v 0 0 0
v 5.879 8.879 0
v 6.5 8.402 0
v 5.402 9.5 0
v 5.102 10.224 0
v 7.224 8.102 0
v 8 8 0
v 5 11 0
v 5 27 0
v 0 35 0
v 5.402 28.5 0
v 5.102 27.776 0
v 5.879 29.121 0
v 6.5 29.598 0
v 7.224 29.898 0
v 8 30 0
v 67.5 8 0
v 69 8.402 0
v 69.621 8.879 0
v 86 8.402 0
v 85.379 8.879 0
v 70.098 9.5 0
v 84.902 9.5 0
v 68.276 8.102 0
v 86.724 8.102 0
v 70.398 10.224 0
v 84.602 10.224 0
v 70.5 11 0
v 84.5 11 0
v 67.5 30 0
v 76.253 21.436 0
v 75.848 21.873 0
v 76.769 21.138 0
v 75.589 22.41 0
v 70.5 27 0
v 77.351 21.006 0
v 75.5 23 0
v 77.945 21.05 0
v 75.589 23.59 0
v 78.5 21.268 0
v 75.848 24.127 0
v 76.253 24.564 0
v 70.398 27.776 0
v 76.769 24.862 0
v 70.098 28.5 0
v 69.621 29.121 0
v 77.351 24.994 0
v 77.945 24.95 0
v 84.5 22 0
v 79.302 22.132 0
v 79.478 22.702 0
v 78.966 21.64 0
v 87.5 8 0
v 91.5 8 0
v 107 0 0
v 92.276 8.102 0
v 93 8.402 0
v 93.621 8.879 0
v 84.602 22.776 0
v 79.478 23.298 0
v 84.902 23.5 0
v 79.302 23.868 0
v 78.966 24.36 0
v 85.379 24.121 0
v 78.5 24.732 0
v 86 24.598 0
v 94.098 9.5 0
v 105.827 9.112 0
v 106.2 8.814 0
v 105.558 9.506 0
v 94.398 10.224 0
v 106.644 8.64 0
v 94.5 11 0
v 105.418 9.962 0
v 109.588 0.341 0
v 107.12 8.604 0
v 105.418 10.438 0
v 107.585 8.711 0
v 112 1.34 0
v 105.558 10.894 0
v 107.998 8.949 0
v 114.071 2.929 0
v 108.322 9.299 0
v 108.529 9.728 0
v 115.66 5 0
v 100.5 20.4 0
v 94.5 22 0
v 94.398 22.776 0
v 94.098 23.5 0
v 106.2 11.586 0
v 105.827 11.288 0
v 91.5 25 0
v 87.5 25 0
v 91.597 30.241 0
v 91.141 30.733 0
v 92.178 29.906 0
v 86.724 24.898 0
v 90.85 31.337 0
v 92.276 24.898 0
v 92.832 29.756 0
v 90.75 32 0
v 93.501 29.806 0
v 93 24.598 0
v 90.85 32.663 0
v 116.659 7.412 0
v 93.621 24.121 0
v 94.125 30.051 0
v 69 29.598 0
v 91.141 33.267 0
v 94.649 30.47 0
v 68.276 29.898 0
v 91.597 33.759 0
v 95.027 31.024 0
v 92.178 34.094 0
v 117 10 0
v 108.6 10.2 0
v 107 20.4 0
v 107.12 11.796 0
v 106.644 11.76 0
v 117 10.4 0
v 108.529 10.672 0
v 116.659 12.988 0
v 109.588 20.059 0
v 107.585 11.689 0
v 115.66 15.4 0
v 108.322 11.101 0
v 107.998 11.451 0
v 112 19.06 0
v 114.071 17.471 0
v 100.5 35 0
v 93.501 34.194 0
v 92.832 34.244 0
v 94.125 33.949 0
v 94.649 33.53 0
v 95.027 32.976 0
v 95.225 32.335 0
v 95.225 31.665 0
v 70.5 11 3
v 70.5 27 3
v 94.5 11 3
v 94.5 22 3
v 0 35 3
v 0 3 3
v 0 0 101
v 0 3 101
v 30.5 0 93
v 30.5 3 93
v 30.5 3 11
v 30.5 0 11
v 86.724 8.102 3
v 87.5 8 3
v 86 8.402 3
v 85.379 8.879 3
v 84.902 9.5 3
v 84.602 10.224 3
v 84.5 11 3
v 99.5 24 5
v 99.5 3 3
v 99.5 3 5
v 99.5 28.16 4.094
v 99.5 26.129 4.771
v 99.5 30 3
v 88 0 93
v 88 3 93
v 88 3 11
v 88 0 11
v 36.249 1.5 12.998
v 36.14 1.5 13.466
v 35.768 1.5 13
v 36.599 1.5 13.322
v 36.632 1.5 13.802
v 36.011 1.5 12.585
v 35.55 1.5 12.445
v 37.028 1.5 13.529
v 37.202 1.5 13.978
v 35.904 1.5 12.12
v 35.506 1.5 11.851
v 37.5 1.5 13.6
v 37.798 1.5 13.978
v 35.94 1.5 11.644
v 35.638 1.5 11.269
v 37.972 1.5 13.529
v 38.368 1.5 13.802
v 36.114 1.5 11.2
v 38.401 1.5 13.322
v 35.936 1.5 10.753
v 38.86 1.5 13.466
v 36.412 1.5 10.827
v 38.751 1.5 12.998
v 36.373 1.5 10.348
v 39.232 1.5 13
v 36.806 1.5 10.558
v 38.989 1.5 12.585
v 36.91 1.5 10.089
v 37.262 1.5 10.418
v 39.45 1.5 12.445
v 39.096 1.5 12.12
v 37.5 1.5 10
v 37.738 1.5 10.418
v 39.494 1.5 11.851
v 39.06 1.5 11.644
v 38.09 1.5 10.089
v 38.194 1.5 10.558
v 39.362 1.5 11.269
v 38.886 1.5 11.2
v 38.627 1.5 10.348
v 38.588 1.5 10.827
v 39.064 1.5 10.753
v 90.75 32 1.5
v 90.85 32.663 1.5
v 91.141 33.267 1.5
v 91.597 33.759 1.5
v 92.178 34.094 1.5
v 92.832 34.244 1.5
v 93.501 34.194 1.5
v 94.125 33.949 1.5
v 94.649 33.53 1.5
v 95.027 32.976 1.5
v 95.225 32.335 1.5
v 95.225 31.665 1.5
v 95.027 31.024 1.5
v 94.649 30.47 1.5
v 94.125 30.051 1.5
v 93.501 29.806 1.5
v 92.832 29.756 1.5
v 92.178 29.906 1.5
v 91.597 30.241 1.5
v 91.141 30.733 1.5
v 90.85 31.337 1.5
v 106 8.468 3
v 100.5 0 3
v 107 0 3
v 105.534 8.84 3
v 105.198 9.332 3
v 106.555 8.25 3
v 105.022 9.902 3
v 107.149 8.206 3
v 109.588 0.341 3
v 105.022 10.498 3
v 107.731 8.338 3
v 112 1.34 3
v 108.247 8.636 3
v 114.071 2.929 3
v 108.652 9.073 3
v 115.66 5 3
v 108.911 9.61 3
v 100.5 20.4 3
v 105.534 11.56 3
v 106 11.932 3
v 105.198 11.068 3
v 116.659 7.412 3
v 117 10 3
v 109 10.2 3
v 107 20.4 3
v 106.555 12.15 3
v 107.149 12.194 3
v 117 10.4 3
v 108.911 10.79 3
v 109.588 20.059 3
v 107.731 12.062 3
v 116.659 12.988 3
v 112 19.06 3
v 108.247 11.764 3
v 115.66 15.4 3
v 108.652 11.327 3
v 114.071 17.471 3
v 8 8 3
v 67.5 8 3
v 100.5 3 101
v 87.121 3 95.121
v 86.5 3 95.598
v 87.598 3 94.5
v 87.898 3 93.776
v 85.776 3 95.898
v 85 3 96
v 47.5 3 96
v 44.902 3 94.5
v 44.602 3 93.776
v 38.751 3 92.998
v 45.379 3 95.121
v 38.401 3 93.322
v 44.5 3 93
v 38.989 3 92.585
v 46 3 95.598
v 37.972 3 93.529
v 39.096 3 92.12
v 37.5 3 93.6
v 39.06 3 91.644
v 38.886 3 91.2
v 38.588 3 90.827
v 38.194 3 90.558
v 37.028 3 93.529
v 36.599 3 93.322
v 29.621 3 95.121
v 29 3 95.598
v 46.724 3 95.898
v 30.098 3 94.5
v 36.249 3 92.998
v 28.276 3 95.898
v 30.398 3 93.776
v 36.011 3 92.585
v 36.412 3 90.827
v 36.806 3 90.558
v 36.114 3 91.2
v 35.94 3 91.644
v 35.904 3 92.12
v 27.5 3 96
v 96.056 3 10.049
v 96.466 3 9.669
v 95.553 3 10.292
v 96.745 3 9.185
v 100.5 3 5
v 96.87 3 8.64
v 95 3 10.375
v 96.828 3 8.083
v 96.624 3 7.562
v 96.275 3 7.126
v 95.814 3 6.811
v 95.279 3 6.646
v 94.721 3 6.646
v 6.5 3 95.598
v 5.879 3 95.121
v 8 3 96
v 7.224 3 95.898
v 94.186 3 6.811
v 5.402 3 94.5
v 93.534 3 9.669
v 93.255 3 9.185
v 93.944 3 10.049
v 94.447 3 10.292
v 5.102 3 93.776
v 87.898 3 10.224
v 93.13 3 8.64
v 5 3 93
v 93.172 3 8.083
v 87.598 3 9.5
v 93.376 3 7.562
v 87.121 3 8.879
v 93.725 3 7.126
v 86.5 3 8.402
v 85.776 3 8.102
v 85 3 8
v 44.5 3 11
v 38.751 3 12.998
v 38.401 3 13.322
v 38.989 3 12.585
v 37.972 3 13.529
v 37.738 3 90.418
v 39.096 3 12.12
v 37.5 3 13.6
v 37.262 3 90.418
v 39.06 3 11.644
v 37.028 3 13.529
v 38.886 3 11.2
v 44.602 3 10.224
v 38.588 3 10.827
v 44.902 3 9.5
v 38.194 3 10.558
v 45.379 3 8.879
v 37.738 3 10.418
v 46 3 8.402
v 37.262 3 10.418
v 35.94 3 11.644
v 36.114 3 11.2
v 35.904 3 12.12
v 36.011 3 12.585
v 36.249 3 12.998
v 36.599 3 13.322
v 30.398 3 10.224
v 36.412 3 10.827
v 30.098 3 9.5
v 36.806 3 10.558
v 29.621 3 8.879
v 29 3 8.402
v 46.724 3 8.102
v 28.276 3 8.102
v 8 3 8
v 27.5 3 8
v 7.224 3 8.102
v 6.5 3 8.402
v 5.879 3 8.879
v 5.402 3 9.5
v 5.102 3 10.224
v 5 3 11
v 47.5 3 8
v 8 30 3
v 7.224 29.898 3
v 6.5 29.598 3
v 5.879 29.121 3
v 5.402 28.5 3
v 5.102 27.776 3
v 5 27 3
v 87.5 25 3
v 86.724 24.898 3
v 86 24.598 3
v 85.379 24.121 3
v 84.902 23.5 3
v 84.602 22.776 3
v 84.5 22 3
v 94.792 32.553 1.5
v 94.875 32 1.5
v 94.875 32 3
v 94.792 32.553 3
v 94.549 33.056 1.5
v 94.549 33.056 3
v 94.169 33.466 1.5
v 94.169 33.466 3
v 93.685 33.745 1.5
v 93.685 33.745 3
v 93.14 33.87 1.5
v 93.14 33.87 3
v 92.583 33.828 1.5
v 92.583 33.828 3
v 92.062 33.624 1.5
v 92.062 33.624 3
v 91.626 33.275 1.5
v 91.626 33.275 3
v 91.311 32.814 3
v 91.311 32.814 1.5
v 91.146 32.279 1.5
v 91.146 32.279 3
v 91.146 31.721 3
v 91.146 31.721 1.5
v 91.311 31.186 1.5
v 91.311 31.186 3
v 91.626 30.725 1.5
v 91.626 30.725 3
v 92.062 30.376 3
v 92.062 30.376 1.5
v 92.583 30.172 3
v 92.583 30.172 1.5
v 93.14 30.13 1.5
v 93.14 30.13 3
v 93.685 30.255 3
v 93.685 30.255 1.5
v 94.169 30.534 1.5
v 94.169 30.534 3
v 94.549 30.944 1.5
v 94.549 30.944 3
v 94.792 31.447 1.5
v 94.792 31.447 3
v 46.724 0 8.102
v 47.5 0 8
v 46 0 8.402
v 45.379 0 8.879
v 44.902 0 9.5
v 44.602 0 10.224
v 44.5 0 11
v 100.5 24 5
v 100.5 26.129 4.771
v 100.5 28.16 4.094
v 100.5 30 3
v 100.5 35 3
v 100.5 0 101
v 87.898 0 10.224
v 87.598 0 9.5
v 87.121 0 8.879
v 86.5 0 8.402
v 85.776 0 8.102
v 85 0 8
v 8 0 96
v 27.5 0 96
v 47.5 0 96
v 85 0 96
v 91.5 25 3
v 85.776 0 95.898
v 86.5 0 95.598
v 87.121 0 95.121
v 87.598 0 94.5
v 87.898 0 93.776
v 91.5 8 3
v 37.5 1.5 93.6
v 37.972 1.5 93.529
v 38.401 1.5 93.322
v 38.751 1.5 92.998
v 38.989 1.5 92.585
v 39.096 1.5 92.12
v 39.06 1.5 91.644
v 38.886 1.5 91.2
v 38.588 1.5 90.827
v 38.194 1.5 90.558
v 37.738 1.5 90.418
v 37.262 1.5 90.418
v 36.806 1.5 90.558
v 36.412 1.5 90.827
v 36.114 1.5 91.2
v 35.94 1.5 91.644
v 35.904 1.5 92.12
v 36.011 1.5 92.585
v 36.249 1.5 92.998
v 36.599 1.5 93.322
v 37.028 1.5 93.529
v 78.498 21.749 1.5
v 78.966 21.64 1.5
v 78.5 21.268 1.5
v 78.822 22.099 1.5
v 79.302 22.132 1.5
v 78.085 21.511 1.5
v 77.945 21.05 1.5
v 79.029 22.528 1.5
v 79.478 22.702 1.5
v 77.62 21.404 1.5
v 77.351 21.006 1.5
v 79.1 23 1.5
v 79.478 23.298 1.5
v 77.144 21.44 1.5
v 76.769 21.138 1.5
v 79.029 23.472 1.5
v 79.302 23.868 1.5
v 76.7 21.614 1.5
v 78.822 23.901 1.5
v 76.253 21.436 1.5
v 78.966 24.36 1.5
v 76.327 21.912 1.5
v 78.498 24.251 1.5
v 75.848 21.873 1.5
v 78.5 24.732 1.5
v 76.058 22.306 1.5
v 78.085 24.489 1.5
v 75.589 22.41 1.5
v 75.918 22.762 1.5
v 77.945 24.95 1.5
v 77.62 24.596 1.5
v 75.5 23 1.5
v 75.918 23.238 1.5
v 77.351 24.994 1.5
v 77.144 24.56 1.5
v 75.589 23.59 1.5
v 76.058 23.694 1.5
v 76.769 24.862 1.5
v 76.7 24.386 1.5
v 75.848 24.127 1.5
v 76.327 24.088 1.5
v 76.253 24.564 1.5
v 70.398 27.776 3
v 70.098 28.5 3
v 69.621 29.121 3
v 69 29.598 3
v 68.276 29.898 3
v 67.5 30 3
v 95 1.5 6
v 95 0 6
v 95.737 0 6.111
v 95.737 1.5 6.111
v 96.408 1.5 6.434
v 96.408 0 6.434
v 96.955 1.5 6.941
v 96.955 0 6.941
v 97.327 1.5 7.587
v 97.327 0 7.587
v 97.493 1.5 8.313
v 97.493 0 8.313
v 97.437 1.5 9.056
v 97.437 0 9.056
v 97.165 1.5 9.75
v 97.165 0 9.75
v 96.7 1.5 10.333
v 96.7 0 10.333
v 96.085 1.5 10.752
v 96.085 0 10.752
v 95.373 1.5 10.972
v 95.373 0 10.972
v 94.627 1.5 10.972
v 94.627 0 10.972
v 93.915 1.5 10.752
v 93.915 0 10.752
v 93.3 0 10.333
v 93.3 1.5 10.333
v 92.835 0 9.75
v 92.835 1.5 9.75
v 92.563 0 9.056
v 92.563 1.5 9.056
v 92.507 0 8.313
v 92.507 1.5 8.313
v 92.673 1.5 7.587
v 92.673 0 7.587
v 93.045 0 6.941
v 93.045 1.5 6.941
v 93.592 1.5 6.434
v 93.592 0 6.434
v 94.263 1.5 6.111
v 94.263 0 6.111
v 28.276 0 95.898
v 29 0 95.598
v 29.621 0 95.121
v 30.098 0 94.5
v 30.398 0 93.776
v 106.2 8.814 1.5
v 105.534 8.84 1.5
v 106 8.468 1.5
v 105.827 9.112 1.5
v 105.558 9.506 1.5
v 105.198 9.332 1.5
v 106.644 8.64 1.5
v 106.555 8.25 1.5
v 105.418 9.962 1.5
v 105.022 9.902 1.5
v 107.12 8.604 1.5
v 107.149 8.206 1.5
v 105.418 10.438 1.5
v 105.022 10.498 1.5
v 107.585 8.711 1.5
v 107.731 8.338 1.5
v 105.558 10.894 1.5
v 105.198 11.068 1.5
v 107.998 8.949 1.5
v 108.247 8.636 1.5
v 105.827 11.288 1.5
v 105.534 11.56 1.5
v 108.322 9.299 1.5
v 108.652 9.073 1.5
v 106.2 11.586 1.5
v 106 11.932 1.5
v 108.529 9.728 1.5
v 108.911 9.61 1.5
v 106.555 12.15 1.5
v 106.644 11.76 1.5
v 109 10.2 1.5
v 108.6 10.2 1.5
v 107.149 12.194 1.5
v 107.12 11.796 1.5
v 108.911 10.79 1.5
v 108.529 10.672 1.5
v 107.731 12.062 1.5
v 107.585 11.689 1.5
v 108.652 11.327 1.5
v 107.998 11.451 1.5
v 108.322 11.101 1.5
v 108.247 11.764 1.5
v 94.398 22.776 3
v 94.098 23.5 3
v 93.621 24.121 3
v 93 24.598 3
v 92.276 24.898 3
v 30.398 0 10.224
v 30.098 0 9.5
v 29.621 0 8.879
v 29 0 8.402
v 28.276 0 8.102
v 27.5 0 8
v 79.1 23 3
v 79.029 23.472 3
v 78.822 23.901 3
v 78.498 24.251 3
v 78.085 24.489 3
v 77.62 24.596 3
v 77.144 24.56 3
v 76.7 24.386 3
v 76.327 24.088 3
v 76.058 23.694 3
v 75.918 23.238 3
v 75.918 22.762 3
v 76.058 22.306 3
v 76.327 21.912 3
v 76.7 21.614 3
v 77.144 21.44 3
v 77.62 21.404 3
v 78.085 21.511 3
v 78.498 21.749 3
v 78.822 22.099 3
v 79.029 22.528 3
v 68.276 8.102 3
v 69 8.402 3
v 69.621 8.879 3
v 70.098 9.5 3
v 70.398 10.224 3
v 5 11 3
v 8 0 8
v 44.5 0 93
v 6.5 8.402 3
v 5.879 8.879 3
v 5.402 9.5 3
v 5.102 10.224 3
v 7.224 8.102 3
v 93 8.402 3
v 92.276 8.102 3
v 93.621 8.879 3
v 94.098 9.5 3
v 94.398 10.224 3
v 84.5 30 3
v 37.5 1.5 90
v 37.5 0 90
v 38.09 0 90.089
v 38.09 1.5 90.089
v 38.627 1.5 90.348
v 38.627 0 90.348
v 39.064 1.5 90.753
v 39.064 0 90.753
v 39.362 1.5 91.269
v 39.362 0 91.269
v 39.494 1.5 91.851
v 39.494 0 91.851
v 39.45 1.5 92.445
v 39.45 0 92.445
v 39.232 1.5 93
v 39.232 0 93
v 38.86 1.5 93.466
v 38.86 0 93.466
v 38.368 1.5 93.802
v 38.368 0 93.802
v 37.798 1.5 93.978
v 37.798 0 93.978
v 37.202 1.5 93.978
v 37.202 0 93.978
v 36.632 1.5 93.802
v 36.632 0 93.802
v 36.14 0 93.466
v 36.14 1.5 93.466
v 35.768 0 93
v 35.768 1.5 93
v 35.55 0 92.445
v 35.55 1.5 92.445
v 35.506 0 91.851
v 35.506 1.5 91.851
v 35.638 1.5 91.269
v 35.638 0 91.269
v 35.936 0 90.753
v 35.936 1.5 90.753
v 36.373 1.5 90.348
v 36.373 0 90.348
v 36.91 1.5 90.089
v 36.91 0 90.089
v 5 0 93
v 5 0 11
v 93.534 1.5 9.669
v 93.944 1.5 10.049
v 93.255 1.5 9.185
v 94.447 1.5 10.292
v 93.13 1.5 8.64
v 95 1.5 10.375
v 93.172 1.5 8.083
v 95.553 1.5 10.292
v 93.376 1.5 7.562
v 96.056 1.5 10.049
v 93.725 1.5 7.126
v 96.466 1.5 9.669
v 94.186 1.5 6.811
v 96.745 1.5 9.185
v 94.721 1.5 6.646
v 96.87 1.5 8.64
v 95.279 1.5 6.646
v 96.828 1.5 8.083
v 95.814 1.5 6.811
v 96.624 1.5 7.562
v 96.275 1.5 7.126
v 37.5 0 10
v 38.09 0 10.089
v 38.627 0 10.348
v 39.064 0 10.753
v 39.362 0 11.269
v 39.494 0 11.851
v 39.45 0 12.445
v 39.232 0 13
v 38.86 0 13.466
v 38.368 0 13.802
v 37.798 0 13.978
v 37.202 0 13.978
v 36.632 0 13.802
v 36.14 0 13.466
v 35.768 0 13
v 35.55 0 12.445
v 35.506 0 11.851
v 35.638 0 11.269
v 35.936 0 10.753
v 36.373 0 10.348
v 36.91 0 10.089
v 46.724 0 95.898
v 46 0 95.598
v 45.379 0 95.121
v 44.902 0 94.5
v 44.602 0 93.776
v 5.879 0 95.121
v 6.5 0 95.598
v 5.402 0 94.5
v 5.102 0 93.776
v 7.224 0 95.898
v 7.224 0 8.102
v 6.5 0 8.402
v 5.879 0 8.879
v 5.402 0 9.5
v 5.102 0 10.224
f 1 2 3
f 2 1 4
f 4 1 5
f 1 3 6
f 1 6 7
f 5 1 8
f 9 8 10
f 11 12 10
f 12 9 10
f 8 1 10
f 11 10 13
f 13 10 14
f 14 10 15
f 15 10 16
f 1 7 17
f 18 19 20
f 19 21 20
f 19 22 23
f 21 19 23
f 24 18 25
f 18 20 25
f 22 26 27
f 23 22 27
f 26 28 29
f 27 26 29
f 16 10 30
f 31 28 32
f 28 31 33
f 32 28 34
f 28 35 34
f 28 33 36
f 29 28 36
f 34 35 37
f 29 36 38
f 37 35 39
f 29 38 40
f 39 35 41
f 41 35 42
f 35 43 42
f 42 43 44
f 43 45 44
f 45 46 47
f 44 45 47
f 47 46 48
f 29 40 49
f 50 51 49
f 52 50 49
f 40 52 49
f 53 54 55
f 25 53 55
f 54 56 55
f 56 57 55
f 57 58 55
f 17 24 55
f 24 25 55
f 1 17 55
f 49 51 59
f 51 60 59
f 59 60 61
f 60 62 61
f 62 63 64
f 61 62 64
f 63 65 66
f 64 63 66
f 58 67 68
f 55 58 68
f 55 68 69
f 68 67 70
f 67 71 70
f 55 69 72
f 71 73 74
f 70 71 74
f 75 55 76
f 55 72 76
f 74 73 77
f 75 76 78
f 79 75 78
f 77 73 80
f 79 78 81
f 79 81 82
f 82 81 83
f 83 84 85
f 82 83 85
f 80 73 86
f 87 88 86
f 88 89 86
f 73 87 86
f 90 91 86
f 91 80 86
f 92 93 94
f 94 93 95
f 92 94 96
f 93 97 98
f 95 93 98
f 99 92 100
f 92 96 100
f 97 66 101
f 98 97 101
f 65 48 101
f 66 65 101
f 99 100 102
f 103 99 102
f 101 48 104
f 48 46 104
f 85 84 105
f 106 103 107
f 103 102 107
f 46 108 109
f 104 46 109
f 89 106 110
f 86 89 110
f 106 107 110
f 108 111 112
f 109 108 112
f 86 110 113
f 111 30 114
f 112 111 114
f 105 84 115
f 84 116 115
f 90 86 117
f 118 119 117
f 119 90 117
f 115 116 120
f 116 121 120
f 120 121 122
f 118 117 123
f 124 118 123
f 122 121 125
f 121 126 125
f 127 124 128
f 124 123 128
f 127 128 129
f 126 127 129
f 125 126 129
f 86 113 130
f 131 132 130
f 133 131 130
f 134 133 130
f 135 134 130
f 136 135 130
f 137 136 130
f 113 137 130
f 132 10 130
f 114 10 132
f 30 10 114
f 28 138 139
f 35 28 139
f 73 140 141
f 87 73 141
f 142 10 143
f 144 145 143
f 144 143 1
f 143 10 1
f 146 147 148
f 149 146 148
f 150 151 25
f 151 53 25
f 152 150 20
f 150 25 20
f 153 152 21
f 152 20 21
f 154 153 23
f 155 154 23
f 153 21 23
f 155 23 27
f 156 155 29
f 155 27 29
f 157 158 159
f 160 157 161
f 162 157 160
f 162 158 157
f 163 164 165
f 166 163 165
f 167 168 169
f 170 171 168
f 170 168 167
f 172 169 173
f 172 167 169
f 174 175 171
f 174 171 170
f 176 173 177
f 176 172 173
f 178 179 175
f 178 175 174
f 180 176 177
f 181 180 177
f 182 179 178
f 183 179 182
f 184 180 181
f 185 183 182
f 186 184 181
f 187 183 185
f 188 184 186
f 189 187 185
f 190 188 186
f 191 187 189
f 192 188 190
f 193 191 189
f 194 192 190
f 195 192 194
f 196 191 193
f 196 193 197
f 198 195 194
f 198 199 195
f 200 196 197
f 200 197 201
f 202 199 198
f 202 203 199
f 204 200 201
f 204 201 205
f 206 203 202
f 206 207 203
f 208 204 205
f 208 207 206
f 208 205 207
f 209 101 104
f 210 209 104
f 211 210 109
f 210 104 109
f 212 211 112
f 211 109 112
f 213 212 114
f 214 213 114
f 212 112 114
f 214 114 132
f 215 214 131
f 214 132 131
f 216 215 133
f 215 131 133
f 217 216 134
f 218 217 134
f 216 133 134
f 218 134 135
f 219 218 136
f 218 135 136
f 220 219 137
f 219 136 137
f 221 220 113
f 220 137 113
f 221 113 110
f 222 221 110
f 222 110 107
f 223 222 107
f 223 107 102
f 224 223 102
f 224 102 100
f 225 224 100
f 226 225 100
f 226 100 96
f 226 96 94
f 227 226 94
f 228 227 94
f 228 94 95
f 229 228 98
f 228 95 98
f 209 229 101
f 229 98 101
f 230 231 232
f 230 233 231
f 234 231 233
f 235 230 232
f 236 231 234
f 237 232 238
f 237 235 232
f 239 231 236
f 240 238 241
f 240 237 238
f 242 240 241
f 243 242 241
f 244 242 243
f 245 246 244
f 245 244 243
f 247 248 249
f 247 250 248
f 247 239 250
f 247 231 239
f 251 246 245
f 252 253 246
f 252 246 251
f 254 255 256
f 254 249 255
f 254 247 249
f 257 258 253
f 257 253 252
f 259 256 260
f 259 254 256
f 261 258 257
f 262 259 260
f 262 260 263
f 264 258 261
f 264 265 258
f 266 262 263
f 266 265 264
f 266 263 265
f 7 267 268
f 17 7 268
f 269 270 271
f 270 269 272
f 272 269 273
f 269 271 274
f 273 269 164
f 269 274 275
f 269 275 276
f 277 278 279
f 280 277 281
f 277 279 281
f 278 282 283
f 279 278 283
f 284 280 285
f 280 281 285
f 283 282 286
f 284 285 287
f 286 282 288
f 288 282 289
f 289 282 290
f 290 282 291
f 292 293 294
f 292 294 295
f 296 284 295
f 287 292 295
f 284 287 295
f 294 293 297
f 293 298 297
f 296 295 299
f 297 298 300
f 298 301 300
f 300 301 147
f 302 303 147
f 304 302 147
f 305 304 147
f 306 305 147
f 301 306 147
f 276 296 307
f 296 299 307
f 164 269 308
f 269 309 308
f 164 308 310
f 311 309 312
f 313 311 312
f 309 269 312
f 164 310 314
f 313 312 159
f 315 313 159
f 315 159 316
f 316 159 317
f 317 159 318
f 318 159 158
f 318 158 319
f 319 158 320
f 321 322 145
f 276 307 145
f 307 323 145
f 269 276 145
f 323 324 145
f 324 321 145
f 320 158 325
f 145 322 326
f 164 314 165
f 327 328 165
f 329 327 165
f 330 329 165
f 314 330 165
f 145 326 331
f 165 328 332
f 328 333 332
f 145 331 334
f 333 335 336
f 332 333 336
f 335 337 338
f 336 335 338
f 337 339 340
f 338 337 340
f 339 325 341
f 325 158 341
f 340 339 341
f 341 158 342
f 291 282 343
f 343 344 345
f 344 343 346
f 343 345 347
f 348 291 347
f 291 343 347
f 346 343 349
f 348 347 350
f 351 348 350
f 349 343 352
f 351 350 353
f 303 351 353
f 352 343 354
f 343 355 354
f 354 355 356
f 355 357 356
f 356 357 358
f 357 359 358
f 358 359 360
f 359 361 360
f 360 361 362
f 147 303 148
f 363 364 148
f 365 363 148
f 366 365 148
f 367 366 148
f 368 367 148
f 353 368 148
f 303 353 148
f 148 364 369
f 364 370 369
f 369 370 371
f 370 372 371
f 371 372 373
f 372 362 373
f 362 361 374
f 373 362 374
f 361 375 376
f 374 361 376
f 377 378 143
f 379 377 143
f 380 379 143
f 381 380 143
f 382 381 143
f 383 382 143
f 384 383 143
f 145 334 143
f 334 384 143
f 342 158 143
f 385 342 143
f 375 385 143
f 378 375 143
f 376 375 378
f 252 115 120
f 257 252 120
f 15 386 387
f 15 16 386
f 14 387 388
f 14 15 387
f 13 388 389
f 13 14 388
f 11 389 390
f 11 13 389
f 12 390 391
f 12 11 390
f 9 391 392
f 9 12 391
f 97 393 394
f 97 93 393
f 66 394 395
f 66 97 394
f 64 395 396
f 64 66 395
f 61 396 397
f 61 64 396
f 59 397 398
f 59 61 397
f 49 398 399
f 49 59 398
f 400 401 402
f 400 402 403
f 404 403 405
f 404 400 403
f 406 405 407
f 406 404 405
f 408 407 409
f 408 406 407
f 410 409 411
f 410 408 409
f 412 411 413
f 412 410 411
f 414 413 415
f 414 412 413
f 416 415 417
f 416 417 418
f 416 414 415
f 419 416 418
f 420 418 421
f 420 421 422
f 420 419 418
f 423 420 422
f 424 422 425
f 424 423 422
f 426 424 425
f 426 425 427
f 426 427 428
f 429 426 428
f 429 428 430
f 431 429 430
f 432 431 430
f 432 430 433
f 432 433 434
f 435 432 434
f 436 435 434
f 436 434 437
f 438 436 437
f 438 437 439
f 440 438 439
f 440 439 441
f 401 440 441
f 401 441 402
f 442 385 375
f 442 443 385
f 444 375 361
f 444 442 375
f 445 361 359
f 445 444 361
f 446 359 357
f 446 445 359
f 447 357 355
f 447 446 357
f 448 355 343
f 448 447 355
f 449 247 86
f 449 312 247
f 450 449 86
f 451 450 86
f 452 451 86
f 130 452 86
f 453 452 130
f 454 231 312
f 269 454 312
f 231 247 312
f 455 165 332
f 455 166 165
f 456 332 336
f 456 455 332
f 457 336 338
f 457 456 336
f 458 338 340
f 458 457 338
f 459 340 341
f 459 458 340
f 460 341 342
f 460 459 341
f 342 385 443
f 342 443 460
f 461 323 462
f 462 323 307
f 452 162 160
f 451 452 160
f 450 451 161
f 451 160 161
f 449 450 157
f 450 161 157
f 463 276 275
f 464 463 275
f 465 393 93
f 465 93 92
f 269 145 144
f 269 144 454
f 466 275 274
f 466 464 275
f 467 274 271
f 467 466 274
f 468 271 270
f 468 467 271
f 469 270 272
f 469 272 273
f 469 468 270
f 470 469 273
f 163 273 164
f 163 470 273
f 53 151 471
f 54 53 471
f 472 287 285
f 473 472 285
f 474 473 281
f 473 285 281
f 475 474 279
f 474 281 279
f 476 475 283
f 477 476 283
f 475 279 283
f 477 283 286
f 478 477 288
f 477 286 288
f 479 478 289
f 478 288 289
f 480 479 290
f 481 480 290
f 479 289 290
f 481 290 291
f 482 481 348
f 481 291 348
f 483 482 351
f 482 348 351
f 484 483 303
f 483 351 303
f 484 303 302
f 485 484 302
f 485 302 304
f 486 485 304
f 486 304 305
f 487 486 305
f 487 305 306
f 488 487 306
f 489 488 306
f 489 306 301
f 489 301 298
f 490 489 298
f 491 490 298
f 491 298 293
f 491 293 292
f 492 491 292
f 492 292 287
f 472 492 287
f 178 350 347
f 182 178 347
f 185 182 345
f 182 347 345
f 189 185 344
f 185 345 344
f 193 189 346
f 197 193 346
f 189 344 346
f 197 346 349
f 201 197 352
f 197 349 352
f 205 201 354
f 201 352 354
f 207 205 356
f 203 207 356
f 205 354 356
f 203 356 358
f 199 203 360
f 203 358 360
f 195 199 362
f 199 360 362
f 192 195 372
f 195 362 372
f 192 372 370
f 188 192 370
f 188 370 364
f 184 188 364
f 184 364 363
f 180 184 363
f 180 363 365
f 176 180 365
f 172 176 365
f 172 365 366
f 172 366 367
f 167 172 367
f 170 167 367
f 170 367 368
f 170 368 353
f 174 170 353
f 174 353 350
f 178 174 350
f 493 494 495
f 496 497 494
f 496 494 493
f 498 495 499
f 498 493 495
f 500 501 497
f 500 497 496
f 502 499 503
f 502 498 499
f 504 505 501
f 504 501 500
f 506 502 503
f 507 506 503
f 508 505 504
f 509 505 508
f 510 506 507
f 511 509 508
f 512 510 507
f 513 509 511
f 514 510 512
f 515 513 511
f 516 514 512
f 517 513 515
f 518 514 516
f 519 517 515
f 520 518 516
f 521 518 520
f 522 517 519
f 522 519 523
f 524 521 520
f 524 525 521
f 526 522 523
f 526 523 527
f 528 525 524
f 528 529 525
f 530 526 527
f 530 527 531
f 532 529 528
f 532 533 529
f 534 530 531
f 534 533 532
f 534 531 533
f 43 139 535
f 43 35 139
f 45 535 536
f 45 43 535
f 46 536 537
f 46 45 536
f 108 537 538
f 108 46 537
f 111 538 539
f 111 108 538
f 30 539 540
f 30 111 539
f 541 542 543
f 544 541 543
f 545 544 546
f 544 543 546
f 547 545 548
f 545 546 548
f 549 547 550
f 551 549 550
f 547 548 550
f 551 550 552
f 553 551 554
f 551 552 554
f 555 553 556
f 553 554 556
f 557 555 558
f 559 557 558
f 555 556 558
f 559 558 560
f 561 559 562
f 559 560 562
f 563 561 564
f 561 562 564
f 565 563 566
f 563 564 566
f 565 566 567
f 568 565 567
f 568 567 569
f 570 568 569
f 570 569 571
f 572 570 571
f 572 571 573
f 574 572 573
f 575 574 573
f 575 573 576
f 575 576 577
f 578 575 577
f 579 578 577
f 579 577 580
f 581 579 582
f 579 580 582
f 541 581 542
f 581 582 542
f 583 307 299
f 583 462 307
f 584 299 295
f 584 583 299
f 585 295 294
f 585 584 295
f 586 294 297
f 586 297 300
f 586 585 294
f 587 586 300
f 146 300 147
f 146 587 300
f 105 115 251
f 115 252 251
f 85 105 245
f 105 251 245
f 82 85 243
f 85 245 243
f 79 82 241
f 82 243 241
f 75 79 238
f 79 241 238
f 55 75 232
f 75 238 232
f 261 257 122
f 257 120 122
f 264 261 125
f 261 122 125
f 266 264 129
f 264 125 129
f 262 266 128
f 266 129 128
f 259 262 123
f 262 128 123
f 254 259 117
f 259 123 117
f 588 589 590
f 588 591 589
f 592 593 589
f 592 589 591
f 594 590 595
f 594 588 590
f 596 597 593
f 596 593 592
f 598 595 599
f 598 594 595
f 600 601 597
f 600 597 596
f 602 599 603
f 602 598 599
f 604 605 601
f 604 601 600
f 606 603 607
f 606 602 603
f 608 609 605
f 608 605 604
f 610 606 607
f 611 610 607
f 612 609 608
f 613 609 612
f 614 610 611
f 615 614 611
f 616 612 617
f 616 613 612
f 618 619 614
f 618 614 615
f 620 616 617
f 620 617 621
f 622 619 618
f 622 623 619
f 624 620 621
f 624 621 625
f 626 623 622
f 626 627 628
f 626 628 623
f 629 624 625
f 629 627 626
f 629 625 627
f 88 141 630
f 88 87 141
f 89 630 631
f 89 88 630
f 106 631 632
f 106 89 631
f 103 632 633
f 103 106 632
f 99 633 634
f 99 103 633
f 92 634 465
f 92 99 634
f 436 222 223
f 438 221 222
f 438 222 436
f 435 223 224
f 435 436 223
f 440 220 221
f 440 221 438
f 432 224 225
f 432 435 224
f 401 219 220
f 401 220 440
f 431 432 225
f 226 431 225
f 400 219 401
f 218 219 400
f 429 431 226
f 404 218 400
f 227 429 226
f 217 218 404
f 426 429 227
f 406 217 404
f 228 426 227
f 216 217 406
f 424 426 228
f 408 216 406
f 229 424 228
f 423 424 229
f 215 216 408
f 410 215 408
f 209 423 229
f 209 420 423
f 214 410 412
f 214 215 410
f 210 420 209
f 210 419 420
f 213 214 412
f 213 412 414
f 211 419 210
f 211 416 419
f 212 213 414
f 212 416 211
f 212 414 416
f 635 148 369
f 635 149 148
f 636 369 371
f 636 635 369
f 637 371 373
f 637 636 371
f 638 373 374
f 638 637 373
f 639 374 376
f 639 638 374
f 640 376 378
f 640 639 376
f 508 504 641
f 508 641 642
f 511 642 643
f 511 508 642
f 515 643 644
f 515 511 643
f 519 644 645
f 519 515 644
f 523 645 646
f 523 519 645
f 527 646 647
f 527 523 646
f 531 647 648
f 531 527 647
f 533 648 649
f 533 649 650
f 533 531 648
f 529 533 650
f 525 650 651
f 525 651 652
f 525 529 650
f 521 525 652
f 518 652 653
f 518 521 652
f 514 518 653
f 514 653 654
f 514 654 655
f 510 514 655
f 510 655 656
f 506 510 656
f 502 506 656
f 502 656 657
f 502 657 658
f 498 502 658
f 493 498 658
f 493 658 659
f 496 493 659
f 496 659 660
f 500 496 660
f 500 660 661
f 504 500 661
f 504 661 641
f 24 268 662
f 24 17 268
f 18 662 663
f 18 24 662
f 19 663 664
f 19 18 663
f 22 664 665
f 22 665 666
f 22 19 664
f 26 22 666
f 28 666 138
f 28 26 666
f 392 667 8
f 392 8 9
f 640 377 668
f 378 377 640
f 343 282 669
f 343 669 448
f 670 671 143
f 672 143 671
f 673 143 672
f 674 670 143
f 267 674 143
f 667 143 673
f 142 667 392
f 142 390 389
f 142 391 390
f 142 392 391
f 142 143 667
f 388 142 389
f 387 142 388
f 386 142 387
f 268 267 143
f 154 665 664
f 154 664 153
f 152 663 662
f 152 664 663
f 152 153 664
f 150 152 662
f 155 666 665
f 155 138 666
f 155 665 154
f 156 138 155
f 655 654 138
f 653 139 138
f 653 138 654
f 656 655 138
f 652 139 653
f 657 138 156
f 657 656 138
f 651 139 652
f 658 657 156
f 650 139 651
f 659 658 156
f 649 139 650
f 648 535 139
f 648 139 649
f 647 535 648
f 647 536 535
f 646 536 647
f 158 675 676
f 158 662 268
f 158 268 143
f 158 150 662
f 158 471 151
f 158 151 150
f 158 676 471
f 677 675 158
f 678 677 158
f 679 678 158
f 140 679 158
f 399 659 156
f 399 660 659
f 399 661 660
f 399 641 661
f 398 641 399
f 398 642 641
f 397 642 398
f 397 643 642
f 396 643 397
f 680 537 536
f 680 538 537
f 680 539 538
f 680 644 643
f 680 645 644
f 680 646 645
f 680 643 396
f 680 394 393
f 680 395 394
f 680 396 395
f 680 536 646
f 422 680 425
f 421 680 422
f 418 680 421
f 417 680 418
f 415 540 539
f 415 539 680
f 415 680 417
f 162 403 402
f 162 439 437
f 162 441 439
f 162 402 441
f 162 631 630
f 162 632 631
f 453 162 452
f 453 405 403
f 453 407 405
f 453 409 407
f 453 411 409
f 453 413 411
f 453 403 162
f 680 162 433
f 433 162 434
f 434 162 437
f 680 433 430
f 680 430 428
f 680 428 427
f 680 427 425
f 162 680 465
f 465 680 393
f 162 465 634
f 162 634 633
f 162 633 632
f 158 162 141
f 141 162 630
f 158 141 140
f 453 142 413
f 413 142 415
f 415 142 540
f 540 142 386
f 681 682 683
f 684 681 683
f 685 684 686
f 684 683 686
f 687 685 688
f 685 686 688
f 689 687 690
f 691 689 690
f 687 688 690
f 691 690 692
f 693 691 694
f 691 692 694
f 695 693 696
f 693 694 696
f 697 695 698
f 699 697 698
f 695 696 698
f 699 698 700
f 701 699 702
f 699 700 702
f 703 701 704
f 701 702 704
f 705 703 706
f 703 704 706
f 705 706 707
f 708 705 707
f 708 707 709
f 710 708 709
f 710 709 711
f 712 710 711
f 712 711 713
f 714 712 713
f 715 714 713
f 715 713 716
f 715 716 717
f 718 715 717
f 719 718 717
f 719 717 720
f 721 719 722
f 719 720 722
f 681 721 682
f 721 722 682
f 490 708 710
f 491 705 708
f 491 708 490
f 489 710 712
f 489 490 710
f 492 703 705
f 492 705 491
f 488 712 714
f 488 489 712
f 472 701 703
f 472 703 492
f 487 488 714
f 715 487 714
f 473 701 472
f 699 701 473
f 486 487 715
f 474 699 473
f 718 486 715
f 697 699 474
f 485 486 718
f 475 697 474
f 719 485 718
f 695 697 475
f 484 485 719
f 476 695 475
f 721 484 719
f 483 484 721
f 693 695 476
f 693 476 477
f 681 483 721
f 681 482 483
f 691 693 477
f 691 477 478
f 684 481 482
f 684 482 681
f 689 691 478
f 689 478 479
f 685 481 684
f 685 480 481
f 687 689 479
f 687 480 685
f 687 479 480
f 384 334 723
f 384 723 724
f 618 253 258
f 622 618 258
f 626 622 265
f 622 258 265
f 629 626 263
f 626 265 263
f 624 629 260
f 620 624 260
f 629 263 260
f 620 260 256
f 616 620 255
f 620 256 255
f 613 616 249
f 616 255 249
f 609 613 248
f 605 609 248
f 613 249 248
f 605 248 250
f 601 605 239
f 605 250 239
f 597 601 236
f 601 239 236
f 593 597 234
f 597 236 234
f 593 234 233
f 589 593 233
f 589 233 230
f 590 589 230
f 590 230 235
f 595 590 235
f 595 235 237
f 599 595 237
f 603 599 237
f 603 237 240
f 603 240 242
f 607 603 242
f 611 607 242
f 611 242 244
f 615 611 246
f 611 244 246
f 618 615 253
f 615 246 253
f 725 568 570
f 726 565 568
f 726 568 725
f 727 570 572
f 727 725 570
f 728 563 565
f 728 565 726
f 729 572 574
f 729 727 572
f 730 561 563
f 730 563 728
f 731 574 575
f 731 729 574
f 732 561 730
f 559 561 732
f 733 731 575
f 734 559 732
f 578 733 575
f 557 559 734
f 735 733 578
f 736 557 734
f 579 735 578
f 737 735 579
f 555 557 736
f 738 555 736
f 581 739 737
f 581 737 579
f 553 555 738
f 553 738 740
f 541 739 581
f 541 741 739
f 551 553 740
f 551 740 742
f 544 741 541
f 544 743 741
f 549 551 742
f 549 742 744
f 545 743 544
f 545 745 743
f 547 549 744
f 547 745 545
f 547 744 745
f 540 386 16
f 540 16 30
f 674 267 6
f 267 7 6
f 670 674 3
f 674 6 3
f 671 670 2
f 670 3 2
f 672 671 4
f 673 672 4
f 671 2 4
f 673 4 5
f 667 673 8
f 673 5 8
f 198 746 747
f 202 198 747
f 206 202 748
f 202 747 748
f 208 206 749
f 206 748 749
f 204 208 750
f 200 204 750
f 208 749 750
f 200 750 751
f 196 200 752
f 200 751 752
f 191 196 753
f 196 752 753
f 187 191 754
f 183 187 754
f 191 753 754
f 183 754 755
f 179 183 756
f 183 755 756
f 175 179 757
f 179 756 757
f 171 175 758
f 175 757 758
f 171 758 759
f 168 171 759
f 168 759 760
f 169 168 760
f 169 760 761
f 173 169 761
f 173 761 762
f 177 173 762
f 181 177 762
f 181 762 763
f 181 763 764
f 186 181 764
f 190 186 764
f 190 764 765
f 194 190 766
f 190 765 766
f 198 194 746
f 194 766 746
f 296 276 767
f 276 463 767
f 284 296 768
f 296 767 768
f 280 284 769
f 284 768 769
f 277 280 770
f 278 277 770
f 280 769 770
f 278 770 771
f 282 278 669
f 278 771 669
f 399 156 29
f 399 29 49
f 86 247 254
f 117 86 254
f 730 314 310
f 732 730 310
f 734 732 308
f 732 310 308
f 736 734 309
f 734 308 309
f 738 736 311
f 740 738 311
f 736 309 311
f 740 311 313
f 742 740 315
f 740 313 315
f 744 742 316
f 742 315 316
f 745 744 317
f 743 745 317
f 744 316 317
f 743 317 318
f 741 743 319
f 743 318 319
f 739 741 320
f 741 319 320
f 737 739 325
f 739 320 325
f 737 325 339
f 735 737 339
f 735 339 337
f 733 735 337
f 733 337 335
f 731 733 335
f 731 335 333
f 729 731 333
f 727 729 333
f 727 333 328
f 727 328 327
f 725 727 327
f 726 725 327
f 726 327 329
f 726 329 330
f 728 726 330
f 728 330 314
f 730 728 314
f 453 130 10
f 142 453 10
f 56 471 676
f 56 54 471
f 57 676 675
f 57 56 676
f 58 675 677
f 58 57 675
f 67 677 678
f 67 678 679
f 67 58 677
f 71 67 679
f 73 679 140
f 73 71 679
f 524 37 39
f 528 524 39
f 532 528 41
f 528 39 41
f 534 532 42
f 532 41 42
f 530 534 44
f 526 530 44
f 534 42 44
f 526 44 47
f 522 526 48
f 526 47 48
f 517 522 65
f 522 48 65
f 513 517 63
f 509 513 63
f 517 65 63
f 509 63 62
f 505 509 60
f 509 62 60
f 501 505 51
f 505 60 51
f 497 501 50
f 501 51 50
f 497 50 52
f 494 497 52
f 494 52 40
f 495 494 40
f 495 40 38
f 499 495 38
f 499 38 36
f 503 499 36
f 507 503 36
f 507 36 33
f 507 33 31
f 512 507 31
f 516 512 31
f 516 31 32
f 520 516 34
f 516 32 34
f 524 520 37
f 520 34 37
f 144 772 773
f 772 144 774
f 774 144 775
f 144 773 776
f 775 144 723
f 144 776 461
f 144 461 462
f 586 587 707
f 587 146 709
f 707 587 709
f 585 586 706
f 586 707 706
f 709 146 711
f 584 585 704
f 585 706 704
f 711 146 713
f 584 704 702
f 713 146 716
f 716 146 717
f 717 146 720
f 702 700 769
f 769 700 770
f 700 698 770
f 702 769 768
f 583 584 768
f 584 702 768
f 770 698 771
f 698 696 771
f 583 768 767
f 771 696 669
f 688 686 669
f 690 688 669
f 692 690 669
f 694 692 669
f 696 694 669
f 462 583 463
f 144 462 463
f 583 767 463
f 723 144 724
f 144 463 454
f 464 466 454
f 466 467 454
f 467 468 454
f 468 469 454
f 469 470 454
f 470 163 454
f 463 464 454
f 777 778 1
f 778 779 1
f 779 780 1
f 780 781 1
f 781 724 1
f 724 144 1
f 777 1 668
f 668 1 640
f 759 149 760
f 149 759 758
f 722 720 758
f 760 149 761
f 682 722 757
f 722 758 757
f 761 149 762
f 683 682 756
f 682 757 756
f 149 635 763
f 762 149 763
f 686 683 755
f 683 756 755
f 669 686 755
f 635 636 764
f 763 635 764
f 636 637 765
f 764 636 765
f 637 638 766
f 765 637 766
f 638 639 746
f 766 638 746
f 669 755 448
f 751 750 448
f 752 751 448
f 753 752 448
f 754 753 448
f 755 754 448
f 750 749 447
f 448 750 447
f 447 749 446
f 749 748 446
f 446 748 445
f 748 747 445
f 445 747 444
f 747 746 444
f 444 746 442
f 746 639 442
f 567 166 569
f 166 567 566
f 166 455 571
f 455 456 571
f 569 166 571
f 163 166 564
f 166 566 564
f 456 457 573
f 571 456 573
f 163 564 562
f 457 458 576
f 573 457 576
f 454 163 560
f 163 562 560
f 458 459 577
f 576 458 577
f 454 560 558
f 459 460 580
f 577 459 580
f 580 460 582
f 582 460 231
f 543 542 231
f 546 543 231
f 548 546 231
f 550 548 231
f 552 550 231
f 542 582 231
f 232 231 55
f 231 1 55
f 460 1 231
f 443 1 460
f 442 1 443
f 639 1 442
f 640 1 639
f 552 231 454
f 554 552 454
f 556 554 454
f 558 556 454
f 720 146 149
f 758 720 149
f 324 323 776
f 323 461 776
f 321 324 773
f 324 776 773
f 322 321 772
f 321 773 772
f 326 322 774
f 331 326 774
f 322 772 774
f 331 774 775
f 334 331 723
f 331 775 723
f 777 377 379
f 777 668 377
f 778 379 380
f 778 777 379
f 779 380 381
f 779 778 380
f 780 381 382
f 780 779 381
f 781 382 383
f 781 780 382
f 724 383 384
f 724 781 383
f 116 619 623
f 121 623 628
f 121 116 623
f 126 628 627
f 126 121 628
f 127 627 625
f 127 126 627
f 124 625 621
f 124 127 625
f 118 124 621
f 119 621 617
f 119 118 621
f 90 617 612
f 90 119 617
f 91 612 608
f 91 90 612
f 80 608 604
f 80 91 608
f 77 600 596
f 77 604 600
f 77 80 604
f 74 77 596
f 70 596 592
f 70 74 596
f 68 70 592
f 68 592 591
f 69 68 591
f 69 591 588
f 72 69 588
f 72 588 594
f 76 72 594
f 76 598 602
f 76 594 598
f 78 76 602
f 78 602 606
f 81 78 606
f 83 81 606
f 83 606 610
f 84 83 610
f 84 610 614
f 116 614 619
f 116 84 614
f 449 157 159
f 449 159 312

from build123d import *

# Parameters (mm, degrees)
SKETCH1_R           = 1.6
SKETCH1_R_2         = 1.875
BOSS_EXTRUDE1_DEPTH = 3
BOSS_EXTRUDE2_DEPTH = 101
SKETCH1_5_W         = 1
SKETCH1_5_H         = 27
BOSS_EXTRUDE3_DEPTH = 5
SKETCH2_W           = 16.5
SKETCH2_H           = 14.6
CUT_EXTRUDE1_DEPTH  = 5
SKETCH3_W           = 16.5
SKETCH3_H           = 98
CUT_EXTRUDE2_DEPTH  = 5
FILLET1_R           = 10
FILLET2_R           = 10
SKETCH4_R           = 1.6
SKETCH4_R_2         = 1.875
CUT_EXTRUDE3_DEPTH  = 5
FILLET3_R           = 10
SKETCH5_R           = 2
SKETCH5_R_2         = 2.5
CUT_EXTRUDE4_DEPTH  = 1.5
SKETCH6_R           = 2
CUT_EXTRUDE5_DEPTH  = 1.5
SKETCH7_R           = 2
SKETCH7_R_2         = 2.25
CUT_EXTRUDE6_DEPTH  = 1.5
SKETCH8_W           = 25.5
SKETCH8_H           = 88
SKETCH8_W_2         = 43.5
CUT_EXTRUDE7_DEPTH  = 10
FILLET4_R           = 3
SKETCH9_W           = 65.5
SKETCH9_H           = 22
SKETCH9_W_2         = 10
SKETCH9_H_2         = 17
CUT_EXTRUDE8_DEPTH  = 10
FILLET5_R           = 3


with BuildPart() as part:
    # Sketch1 → Boss-Extrude1 (new body)
    # profile 1 of 2: a face of its own
    with BuildSketch(Plane.XY):
        Polygon((0, 3), (0, 0), (117, 0), (117, 3), (100.5, 3), (99.5, 3), align=None)
    # profile 2 of 2: a face of its own
    with BuildSketch(Plane.XY):
        Polygon((0, 35), (0, 3), (99.5, 3), (99.5, 30), (100.5, 30), (100.5, 3), (117, 3), (117, 35), align=None)
        with Locations((107, 10.2)):
            Circle(SKETCH1_R, mode=Mode.SUBTRACT)
        with Locations((77.5, 23)):
            Circle(SKETCH1_R, mode=Mode.SUBTRACT)
        with Locations((93, 32)):
            Circle(SKETCH1_R_2, mode=Mode.SUBTRACT)
    extrude(amount=BOSS_EXTRUDE1_DEPTH)

    # Sketch1<4> → Boss-Extrude2 (add)
    with BuildSketch(Plane.XY):
        Polygon((0, 3), (0, 0), (117, 0), (117, 3), (100.5, 3), (99.5, 3), align=None)
    extrude(amount=BOSS_EXTRUDE2_DEPTH)

    # Sketch1<5> → Boss-Extrude3 (add)
    with BuildSketch(Plane.XY):
        with Locations((100, 16.5)):
            Rectangle(SKETCH1_5_W, SKETCH1_5_H)
    extrude(amount=BOSS_EXTRUDE3_DEPTH)

    # Sketch2 → Cut-Extrude1 (cut)
    with BuildSketch(Plane.XY.offset(3)):
        with Locations((108.75, 27.7)):
            Rectangle(SKETCH2_W, SKETCH2_H)
    extrude(amount=-CUT_EXTRUDE1_DEPTH, mode=Mode.SUBTRACT)

    # Sketch3 → Cut-Extrude2 (cut)
    with BuildSketch(Plane(origin=(0, 3, 0), x_dir=(1, 0, 0), z_dir=(0, 1, 0))):
        with Locations((108.75, -52)):
            Rectangle(SKETCH3_W, SKETCH3_H)
    extrude(amount=-CUT_EXTRUDE2_DEPTH, mode=Mode.SUBTRACT)

    # Fillet1
    fillet1_edges = [part.edges().sort_by_distance(p)[0] for p in [
        (117, 20.4, 1.5),
    ]]
    fillet(fillet1_edges, radius=FILLET1_R)

    # Fillet2
    fillet2_edges = [part.edges().sort_by_distance(p)[0] for p in [
        (117, 0, 1.5),
    ]]
    fillet(fillet2_edges, radius=FILLET2_R)

    # Sketch4 → Cut-Extrude3 (cut)
    with BuildSketch(Plane(origin=(0, 3, 0), x_dir=(1, 0, 0), z_dir=(0, 1, 0))):
        with Locations(Location((37.5, -12, 0), (0, 0, 270))):
            Circle(SKETCH4_R)
        with Locations(Location((37.5, -92, 0), (0, 0, 270))):
            Circle(SKETCH4_R)
        with Locations(Location((95, -8.5, 0), (0, 0, 270))):
            Circle(SKETCH4_R_2)
    extrude(amount=-CUT_EXTRUDE3_DEPTH, mode=Mode.SUBTRACT)

    # Fillet3
    # the kernel refuses this fillet: 10 mm, written as the material it takes off along each edge
    with BuildSketch(Plane(origin=(84.5, 30, 5), x_dir=(0, 0, -1), z_dir=(1, 0, 0))) as fillet3_piece_1:
        with BuildLine():
            CenterArc((10, -6), FILLET3_R, 143.130102354, 36.869897646)
            Line((0, -6), (-0.2, -6))
            Line((-0.2, -6), (-0.2, 0))
            Line((-0.2, 0), (0, 0.2))
            ThreePointArc((0, 0.2), (1, 0.2), (1.84, 0.12))
            Line((1.84, 0.12), (2, 0))
        make_face()
    extrude(amount=31, mode=Mode.SUBTRACT)

    # Sketch5 → Cut-Extrude4 (cut)
    with BuildSketch(Plane.XZ):
        with Locations(Location((37.5, 92, 0), (0, 0, 270))):
            Circle(SKETCH5_R)
        with Locations(Location((37.5, 12, 0), (0, 0, 270))):
            Circle(SKETCH5_R)
        with Locations(Location((95, 8.5, 0), (0, 0, 270))):
            Circle(SKETCH5_R_2)
    extrude(amount=-CUT_EXTRUDE4_DEPTH, mode=Mode.SUBTRACT)

    # Sketch6 → Cut-Extrude5 (cut)
    with BuildSketch(Plane.XY.offset(3)):
        with Locations((107, 10.2)):
            Circle(SKETCH6_R)
    extrude(amount=-CUT_EXTRUDE5_DEPTH, mode=Mode.SUBTRACT)

    # Sketch7 → Cut-Extrude6 (cut)
    with BuildSketch(Plane(origin=(0, 0, 0), x_dir=(-1, 0, 0), z_dir=(0, 0, -1))):
        with Locations((-77.5, 23)):
            Circle(SKETCH7_R)
        with Locations((-93, 32)):
            Circle(SKETCH7_R_2)
    extrude(amount=-CUT_EXTRUDE6_DEPTH, mode=Mode.SUBTRACT)

    # Sketch8 → Cut-Extrude7 (cut)
    with BuildSketch(Plane(origin=(0, 3, 0), x_dir=(1, 0, 0), z_dir=(0, 1, 0))):
        with Locations((17.75, -52)):
            Rectangle(SKETCH8_W, SKETCH8_H)
        with Locations((66.25, -52)):
            Rectangle(SKETCH8_W_2, SKETCH8_H)
    extrude(amount=-CUT_EXTRUDE7_DEPTH, mode=Mode.SUBTRACT)

    # Fillet4
    fillet4_edges = [part.edges().sort_by_distance(p)[0] for p in [
        (5, 1.5, 96),
        (5, 1.5, 8),
        (30.5, 1.5, 8),
        (30.5, 1.5, 96),
        (44.5, 1.5, 96),
        (44.5, 1.5, 8),
        (88, 1.5, 8),
        (88, 1.5, 96),
    ]]
    fillet(fillet4_edges, radius=FILLET4_R)

    # Sketch9 → Cut-Extrude8 (cut)
    with BuildSketch(Plane.XY.offset(3)):
        with Locations((37.75, 19)):
            Rectangle(SKETCH9_W, SKETCH9_H)
        with Locations((89.5, 16.5)):
            Rectangle(SKETCH9_W_2, SKETCH9_H_2)
    extrude(amount=-CUT_EXTRUDE8_DEPTH, mode=Mode.SUBTRACT)

    # Fillet5
    fillet5_edges = [part.edges().sort_by_distance(p)[0] for p in [
        (5, 8, 1.5),
        (5, 30, 1.5),
        (70.5, 30, 1.5),
        (70.5, 8, 1.5),
        (84.5, 8, 1.5),
        (84.5, 25, 1.5),
        (94.5, 25, 1.5),
        (94.5, 8, 1.5),
    ]]
    fillet(fillet5_edges, radius=FILLET5_R)


solid = part.part
